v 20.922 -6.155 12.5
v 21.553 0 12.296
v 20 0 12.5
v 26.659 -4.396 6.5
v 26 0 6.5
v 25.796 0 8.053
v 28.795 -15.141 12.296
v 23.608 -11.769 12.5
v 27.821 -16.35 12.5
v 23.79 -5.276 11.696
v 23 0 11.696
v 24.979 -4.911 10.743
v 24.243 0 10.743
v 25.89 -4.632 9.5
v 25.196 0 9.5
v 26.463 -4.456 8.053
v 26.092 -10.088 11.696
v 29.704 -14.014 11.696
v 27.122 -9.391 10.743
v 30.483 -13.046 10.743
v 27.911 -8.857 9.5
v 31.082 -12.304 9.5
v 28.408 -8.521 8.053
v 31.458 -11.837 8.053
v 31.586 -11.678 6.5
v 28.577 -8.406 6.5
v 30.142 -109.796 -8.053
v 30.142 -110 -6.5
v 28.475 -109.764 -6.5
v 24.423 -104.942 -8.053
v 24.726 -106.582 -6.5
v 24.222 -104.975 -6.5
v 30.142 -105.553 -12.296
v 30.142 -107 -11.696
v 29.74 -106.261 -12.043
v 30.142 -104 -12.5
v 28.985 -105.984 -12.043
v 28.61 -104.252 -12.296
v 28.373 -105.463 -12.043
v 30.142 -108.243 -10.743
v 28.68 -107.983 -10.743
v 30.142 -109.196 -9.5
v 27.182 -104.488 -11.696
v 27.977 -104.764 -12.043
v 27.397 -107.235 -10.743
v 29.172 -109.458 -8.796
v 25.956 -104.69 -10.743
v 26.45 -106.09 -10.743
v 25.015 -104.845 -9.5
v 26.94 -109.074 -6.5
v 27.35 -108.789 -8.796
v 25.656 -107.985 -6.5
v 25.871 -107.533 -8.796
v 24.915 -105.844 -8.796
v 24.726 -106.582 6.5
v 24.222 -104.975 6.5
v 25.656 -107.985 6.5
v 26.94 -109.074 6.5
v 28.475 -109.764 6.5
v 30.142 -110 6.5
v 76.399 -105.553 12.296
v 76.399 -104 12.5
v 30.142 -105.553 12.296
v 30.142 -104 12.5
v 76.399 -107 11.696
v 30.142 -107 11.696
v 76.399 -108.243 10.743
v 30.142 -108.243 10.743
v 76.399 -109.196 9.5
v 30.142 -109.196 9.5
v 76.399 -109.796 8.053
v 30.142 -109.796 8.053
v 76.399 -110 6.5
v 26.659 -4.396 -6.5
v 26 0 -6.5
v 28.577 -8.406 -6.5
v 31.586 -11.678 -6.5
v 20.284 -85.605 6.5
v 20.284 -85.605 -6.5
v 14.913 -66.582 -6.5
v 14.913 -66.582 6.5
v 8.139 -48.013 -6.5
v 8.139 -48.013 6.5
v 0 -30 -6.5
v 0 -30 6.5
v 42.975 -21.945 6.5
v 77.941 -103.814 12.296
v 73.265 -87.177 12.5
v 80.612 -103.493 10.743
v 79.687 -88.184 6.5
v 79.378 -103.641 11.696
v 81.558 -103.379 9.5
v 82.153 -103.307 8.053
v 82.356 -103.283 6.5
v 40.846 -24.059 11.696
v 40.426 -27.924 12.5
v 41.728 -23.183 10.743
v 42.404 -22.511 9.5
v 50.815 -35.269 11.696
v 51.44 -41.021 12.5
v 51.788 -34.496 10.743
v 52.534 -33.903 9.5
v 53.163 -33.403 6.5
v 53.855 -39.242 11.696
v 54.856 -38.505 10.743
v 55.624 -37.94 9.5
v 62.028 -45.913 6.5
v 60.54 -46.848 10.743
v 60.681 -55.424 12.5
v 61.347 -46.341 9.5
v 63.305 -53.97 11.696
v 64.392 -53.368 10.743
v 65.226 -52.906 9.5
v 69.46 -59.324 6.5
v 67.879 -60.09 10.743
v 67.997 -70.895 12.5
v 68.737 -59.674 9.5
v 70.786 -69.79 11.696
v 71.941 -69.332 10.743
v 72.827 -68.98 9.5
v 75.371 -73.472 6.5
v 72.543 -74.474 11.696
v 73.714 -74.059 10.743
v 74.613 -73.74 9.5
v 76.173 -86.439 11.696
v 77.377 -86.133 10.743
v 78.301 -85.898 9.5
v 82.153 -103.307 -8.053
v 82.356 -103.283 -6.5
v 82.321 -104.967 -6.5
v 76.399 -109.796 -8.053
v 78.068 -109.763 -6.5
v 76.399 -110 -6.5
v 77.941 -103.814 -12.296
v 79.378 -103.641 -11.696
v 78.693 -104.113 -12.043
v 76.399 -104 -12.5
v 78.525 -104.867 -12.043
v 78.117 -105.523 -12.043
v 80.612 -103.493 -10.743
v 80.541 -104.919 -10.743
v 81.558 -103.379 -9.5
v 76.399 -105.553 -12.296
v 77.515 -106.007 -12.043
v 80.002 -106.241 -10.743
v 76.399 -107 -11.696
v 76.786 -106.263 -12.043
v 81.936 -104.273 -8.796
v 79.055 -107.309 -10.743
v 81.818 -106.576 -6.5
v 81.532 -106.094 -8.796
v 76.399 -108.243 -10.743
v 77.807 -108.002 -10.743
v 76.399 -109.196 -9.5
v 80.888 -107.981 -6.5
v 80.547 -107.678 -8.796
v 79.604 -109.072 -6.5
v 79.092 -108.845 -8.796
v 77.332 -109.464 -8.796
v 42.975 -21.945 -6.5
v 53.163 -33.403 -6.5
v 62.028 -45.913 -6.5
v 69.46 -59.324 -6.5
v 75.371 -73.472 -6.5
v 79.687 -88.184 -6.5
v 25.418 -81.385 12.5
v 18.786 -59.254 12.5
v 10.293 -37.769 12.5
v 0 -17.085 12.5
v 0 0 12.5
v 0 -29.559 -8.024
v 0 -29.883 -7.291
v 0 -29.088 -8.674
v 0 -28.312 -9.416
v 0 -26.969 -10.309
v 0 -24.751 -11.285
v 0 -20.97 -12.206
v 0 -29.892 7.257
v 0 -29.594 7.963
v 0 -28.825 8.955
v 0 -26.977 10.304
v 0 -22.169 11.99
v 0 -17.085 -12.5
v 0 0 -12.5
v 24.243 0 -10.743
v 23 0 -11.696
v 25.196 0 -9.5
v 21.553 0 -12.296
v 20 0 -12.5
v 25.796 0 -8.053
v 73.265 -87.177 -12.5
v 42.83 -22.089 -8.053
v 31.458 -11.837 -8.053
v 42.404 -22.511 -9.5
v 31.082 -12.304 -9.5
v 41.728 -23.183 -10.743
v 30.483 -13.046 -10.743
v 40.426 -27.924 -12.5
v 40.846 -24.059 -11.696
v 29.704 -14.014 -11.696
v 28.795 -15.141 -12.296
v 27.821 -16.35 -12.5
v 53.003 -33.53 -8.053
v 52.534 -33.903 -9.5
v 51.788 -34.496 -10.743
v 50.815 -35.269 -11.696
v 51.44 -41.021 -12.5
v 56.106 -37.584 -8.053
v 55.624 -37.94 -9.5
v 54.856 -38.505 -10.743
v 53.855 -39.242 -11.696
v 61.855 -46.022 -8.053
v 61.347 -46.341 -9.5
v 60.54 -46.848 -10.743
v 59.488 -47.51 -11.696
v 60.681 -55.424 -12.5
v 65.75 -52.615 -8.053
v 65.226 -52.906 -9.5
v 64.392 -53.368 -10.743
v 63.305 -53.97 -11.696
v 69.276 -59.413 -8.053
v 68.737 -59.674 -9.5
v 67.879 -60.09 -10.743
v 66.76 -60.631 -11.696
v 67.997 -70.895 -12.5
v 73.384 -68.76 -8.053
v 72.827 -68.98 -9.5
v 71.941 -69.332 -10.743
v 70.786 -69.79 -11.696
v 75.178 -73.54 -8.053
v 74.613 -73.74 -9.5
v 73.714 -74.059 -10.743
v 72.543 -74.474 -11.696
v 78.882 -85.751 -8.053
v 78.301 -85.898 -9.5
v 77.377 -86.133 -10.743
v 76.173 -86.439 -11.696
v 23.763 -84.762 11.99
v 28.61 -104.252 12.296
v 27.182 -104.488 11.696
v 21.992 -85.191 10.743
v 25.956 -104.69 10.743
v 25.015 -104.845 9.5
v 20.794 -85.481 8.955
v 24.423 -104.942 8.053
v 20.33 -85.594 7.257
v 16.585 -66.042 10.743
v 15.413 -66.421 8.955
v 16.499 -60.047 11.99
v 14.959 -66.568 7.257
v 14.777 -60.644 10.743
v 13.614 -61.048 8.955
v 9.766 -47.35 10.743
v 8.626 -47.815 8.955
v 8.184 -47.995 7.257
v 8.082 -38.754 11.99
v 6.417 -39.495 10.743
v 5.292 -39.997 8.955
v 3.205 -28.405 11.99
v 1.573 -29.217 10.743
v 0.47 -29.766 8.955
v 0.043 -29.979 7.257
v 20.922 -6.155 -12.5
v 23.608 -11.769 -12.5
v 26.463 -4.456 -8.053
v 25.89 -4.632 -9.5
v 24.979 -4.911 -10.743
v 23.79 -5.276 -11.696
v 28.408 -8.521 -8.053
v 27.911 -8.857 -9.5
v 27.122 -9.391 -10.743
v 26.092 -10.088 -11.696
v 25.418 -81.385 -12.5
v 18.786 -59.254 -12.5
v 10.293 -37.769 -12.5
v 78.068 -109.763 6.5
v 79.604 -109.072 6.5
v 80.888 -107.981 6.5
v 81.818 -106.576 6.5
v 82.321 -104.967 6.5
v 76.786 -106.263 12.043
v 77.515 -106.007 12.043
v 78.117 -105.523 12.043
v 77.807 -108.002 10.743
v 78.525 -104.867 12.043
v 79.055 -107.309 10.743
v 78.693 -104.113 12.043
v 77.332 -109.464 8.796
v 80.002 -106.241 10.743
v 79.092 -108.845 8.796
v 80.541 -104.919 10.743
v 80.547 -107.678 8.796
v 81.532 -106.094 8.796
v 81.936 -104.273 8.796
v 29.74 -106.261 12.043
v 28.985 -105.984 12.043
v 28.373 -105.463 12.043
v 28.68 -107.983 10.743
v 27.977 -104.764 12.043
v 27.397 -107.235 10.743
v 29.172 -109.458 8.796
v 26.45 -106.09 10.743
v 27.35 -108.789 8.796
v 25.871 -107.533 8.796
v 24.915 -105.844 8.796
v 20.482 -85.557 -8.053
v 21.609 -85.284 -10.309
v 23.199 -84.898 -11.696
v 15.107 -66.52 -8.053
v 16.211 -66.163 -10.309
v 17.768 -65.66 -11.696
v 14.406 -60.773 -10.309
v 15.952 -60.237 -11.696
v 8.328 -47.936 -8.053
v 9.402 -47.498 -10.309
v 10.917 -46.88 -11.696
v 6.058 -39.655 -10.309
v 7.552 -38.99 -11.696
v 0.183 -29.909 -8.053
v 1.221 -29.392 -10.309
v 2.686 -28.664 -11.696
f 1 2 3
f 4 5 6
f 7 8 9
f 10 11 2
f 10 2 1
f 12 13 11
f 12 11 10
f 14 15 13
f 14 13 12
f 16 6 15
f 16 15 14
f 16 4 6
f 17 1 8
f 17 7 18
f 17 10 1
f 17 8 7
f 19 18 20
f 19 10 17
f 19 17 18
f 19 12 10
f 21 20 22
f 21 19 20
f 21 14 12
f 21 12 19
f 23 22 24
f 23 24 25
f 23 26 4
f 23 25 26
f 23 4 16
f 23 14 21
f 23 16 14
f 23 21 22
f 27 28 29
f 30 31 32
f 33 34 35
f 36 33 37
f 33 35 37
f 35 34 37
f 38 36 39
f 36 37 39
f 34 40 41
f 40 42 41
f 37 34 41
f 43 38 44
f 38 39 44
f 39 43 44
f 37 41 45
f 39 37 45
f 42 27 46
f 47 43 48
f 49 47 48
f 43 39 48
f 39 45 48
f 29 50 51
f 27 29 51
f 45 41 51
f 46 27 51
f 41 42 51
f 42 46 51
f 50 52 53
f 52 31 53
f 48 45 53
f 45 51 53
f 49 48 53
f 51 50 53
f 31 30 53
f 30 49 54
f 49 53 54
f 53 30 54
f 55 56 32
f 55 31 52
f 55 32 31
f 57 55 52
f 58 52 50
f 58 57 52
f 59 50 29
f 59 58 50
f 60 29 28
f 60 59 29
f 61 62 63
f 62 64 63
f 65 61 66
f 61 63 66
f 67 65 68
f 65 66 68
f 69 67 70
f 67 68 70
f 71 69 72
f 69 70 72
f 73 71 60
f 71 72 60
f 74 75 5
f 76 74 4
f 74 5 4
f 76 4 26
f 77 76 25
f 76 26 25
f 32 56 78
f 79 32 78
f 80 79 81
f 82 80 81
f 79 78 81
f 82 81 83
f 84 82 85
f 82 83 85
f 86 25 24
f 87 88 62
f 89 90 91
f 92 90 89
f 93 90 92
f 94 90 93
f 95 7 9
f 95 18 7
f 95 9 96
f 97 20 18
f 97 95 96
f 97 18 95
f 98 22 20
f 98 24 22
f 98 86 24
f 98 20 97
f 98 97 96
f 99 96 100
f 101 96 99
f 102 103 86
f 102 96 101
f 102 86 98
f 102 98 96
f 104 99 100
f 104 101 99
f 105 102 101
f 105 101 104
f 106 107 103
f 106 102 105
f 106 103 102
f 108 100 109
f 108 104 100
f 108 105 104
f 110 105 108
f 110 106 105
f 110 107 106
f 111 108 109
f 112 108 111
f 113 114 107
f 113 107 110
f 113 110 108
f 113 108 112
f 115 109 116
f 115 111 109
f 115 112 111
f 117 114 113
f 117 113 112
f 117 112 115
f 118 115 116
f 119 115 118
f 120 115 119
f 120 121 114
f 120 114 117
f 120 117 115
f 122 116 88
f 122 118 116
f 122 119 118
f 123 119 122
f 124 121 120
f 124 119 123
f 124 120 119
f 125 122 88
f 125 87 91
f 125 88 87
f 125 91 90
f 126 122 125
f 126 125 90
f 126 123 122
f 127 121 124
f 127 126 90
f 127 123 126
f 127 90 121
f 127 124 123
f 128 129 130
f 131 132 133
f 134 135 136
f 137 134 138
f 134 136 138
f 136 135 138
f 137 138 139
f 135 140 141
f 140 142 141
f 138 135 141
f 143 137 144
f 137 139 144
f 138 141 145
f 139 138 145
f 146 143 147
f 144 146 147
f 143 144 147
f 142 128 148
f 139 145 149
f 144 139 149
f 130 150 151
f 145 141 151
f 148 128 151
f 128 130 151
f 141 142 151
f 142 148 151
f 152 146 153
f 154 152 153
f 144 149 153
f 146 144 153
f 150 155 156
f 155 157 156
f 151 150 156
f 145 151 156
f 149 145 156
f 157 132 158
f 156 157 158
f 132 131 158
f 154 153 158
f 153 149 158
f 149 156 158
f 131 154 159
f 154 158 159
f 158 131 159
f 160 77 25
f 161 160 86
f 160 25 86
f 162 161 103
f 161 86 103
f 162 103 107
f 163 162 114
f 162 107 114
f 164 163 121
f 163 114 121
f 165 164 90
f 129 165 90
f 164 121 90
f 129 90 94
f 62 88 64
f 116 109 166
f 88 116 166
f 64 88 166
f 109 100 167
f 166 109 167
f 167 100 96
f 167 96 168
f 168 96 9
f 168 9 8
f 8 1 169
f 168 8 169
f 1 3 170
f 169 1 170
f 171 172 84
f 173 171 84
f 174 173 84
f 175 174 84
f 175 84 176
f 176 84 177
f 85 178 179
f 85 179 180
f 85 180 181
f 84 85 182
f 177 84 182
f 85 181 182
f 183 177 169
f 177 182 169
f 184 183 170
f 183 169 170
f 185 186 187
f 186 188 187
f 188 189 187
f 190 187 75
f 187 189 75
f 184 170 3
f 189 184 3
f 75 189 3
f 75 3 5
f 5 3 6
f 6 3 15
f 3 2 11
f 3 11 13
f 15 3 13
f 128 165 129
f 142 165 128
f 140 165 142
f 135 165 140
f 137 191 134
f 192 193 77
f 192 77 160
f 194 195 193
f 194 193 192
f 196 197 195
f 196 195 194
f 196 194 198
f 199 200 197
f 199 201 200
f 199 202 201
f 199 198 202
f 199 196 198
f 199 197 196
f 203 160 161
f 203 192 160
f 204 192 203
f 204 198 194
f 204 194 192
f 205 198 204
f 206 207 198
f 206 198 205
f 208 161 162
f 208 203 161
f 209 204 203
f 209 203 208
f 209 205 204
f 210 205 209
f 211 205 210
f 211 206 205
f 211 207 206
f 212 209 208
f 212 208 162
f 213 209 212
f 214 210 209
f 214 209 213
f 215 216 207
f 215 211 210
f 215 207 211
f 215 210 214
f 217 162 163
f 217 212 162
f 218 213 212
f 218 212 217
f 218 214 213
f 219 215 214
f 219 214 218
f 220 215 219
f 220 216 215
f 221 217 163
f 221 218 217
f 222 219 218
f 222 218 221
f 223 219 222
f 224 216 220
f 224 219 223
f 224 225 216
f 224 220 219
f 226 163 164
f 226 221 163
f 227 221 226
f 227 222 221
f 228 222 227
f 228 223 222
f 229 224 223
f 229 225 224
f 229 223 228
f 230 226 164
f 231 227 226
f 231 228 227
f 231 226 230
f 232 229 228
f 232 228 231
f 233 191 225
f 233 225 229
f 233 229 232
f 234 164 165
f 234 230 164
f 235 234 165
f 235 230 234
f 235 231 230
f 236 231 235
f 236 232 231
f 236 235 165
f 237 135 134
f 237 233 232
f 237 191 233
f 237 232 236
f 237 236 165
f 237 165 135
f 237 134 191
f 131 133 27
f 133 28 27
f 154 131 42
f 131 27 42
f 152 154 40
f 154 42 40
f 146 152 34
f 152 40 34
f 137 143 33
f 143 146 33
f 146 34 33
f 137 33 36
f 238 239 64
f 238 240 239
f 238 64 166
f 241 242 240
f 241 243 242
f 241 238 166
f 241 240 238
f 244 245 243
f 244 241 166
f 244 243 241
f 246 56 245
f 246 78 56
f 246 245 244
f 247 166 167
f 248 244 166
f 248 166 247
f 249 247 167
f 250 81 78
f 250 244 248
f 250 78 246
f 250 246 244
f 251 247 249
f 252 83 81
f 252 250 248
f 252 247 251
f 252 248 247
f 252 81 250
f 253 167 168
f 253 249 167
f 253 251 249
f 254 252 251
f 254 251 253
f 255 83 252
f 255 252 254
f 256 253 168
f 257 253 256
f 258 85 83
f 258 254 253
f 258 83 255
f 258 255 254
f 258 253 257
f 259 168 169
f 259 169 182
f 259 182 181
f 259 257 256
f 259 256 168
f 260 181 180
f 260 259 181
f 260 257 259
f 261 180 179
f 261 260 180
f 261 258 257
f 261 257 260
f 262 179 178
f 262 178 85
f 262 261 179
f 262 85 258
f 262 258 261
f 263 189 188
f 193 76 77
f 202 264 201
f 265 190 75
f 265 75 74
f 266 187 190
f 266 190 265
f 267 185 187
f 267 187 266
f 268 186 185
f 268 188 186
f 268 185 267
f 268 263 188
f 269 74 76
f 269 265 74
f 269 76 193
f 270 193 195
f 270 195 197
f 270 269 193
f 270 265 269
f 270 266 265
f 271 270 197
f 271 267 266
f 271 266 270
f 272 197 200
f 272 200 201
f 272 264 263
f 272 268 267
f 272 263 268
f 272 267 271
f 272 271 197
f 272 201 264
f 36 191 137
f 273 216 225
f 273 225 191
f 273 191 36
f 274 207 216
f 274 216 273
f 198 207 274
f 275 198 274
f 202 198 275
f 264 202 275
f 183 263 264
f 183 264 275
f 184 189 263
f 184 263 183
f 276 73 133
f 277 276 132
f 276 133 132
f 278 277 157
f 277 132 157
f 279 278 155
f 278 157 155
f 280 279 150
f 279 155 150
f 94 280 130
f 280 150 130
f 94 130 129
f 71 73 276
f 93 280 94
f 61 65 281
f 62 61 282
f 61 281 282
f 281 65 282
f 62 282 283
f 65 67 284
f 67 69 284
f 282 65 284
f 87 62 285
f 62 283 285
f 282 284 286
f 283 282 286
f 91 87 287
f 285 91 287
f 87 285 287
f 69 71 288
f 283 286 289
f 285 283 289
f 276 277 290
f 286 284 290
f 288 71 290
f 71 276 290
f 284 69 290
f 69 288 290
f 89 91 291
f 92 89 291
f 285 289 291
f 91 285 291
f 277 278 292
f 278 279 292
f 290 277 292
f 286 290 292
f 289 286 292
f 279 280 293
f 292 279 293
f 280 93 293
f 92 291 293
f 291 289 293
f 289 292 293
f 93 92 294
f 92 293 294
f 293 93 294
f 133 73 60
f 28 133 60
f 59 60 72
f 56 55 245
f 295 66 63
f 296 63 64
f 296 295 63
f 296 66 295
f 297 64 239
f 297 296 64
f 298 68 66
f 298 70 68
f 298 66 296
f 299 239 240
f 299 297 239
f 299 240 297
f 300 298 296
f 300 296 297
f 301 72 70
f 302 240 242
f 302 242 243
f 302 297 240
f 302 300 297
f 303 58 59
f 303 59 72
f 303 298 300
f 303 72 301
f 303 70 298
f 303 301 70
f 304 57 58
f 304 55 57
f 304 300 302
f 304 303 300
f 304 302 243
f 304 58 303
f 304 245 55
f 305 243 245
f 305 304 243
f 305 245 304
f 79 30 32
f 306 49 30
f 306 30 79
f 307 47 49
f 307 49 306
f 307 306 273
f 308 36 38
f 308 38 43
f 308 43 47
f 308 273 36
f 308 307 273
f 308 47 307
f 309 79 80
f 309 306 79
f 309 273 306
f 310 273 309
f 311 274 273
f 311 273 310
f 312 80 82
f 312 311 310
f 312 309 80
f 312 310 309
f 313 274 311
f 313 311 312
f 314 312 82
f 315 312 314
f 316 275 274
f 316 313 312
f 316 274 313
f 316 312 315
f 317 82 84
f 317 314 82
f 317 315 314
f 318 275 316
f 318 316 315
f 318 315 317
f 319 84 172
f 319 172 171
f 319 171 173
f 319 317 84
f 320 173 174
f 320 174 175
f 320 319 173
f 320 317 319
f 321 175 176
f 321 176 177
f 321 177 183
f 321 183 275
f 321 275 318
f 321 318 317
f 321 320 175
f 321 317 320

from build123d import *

# Parameters (mm, degrees)
EXTRUDE_1_DEPTH = 12.5
FILLET_1_R      = 6


with BuildPart() as part:
    # 草图1 → 凸台-拉伸1 (new, symmetric)
    with BuildSketch(Plane.XY):
        with BuildLine():
            Line((0, 0), (26, 0))
            ThreePointArc((26, 0), (27.468456661, -6.472815065), (31.586311315, -11.678290343))
            ThreePointArc((31.586311315, -11.678290343), (67.528745318, -55.48682347), (83, -110))
            Line((83, -110), (25, -110))
            ThreePointArc((25, -110), (15.68286649, -69.005354222), (0, -30))
            Line((0, -30), (0, 0))
        make_face()
    extrude(amount=EXTRUDE_1_DEPTH, both=True)

    # 圆角1
    fillet_1_edges = [part.edges().sort_by_distance(p)[0] for p in [
        (83, -110, 0),
        (25, -110, 0),
        (54, -110, 12.5),
        (67.528745318, -55.48682347, 12.5),
        (27.468456661, -6.472815065, 12.5),
        (27.468456661, -6.472815065, -12.5),
        (67.528745318, -55.48682347, -12.5),
        (54, -110, -12.5),
        (15.68286649, -69.005354222, -12.5),
        (15.68286649, -69.005354222, 12.5),
    ]]
    fillet(fillet_1_edges, radius=FILLET_1_R)


solid = part.part
